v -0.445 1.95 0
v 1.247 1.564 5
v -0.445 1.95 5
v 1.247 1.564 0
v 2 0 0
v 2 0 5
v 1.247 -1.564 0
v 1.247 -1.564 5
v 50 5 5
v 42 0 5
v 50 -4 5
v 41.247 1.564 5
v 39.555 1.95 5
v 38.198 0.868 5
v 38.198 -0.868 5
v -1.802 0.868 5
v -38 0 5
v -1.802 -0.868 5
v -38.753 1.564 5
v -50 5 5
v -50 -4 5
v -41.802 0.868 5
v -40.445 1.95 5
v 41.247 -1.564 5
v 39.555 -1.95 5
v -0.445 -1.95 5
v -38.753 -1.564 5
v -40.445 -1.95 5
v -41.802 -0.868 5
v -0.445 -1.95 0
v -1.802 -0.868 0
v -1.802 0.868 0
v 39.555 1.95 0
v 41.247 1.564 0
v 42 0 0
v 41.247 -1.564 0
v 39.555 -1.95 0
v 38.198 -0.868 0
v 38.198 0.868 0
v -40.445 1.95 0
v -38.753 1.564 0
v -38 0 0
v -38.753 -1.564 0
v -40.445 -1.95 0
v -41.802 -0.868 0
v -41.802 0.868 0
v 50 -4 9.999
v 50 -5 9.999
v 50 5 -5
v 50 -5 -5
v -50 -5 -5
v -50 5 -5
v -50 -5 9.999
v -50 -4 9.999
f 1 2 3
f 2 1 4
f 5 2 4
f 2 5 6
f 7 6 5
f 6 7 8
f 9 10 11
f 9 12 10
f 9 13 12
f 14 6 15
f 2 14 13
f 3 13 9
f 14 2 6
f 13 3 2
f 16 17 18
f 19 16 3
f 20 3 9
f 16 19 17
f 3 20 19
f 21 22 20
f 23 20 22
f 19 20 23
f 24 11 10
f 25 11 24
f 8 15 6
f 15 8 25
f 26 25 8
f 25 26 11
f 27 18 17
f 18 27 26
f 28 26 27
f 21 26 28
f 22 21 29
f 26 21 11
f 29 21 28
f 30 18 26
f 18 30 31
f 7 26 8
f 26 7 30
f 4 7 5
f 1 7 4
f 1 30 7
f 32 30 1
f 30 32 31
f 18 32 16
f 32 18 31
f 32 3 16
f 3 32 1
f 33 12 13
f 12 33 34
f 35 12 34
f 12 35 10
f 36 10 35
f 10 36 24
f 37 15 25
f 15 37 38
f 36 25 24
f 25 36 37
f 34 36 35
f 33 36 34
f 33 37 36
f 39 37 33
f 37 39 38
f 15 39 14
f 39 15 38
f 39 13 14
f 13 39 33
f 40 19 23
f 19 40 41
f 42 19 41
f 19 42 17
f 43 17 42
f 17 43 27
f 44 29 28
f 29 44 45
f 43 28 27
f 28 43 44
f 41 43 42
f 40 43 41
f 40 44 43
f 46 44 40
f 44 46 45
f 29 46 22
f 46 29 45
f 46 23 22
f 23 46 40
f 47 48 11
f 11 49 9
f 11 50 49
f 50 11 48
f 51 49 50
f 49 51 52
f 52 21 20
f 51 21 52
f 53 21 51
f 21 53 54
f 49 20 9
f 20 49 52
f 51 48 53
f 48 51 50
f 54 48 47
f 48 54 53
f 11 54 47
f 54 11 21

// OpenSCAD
// file: base.scad
// base_plate_elevation: Height at which the diorama should be placed in cm
// base_plate_support: Length of base plate bracket minus thickness of covers in cm
// base_plate_length: Side length of the base plate in cm
// base_plate_height: Height of base plate in cm
// cover_thickness: Thickness of cover material
// drillings: Boolean to include or exclude drillings
// drilling_radius: Radius of the drillings in cm

// Maybe offset of cover_thickness is needed to have correct length inside (e.g. base_plate_length needs to be 102 and not 100 to fit 100 length diorama)!!!

// Main base module with optional drillings
module base(base_plate_elevation, base_plate_support, base_plate_length, base_plate_height, cover_thickness, drillings, drilling_radius) {
    // Support structure
    difference() {
        cube(size=[base_plate_length, base_plate_support, base_plate_elevation], center=true);
        if (drillings) {
            if (base_plate_length >= 100) {
                for (i=[0:40:base_plate_length/2]) {
                    translate([i, 0, base_plate_elevation/4]) {
                        cylinder(r=drilling_radius, h=base_plate_elevation/2, center=true);
                    }
                    translate([-i, 0, base_plate_elevation/4]) {
                        cylinder(r=drilling_radius, h=base_plate_elevation/2, center=true);
                    }
                }
            } else {
                translate([0, 0, base_plate_elevation/4]) {
                    cylinder(r=drilling_radius, h=base_plate_elevation/2, center=true);
                }
            }
        }
    }
    
    // Base plate cover
    translate([0, -(base_plate_support/2 - cover_thickness/2), base_plate_elevation/2 + base_plate_height/2 - 0.001]) {
        cube(size=[base_plate_length, cover_thickness, base_plate_height], center=true);
    }
}

// Adds a female connector on the right side for interconnecting inidividual sections
module female_connector(base_plate_length, base_plate_support) {
    translate([base_plate_length/2, base_plate_support/2 - base_plate_support/2, 0]) {
        rotate([0, 0, 90]) {
            cube(size=[5, 10, 5], center=true);
        }
    }
}

// Adds a male connector on the left side for interconnecting inidividual sections
module male_connector(base_plate_length, base_plate_support) {
    translate([-(base_plate_length/2), base_plate_support/2 - base_plate_support/2, 0]) {
        rotate([0, 0, 90]) {
            cube(size=[5, 10, 5], center=true);
        }
    }
}

// Adds a right corner connector for 90° connections
module right_corner_connector(base_plate_length, base_plate_support) {
    translate([base_plate_length/2 - 5, base_plate_support/2, 0]) {
        cube(size=[5, 10, 5], center=true);
    }
}

// Adds a left corner connector for 90° connections
module left_corner_connector(base_plate_length, base_plate_support) {
    translate([-(base_plate_length/2 - 5), base_plate_support/2, 0]) {
        cube(size=[5, 10, 5], center=true);
    }
}

// Adds a right side cover for corner sections
module right_side_cover(base_plate_length, base_plate_elevation, base_plate_support, base_plate_height, cover_thickness) {
    translate([base_plate_length/2 - cover_thickness/2, 0, base_plate_elevation/2 + base_plate_height/2 - 0.001]) {
        rotate([0, 0, 90]) {
            cube(size=[base_plate_support, cover_thickness, base_plate_height], center=true);
        }
    }
}

// Adds a left side cover for corner sections
module left_side_cover(base_plate_length, base_plate_elevation, base_plate_support, base_plate_height, cover_thickness) {
    translate([-(base_plate_length/2 - cover_thickness/2), 0, base_plate_elevation/2 + base_plate_height/2 - 0.001]) {
        rotate([0, 0, 90]) {
            cube(size=[base_plate_support, cover_thickness, base_plate_height], center=true);
        }
    }
}
// main file
use <base.scad>

base_plate_elevation=10;    // Height at which the diorama should be placed in cm
base_plate_support=10;      // Depth of base plate bracket minus thickness of covers in cm
base_plate_length=100;      // Side length of the base plate (section) in cm

base_plate_height=5;        // Thichkness of base plate in cm
cover_thickness=1;          // Thickness of base cover

drillings=true;             // Drillings to mount the base plate
drilling_radius=2;          // Radius of the drillings in cm

female_connector=false;     // Include a female connector on the left side of this section
male_connector=false;       // Include a male connector on the right side of this section

right_corner_connection=false;    // Include a corner connector on the right side for 90° connections
left_corner_connection=false;     // Include a corner connector on the left side for 90° connections


if (female_connector) {
    difference() {
        base(base_plate_elevation, base_plate_support, base_plate_length, base_plate_height, cover_thickness, drillings, drilling_radius);
        female_connector(base_plate_length, base_plate_support);
    }
} else {
    base(base_plate_elevation, base_plate_support, base_plate_length, base_plate_height, cover_thickness, drillings, drilling_radius);
}

if (male_connector) {
    male_connector(base_plate_length, base_plate_support);
}

if (right_corner_connection) {
    right_corner_connector(base_plate_length, base_plate_support);
    right_side_cover(base_plate_length, base_plate_support, base_plate_elevation, base_plate_height, cover_thickness);
}

if (left_corner_connection) {
    left_corner_connector(base_plate_length, base_plate_support);
    left_side_cover(base_plate_length, base_plate_support, base_plate_elevation, base_plate_height, cover_thickness);
}
